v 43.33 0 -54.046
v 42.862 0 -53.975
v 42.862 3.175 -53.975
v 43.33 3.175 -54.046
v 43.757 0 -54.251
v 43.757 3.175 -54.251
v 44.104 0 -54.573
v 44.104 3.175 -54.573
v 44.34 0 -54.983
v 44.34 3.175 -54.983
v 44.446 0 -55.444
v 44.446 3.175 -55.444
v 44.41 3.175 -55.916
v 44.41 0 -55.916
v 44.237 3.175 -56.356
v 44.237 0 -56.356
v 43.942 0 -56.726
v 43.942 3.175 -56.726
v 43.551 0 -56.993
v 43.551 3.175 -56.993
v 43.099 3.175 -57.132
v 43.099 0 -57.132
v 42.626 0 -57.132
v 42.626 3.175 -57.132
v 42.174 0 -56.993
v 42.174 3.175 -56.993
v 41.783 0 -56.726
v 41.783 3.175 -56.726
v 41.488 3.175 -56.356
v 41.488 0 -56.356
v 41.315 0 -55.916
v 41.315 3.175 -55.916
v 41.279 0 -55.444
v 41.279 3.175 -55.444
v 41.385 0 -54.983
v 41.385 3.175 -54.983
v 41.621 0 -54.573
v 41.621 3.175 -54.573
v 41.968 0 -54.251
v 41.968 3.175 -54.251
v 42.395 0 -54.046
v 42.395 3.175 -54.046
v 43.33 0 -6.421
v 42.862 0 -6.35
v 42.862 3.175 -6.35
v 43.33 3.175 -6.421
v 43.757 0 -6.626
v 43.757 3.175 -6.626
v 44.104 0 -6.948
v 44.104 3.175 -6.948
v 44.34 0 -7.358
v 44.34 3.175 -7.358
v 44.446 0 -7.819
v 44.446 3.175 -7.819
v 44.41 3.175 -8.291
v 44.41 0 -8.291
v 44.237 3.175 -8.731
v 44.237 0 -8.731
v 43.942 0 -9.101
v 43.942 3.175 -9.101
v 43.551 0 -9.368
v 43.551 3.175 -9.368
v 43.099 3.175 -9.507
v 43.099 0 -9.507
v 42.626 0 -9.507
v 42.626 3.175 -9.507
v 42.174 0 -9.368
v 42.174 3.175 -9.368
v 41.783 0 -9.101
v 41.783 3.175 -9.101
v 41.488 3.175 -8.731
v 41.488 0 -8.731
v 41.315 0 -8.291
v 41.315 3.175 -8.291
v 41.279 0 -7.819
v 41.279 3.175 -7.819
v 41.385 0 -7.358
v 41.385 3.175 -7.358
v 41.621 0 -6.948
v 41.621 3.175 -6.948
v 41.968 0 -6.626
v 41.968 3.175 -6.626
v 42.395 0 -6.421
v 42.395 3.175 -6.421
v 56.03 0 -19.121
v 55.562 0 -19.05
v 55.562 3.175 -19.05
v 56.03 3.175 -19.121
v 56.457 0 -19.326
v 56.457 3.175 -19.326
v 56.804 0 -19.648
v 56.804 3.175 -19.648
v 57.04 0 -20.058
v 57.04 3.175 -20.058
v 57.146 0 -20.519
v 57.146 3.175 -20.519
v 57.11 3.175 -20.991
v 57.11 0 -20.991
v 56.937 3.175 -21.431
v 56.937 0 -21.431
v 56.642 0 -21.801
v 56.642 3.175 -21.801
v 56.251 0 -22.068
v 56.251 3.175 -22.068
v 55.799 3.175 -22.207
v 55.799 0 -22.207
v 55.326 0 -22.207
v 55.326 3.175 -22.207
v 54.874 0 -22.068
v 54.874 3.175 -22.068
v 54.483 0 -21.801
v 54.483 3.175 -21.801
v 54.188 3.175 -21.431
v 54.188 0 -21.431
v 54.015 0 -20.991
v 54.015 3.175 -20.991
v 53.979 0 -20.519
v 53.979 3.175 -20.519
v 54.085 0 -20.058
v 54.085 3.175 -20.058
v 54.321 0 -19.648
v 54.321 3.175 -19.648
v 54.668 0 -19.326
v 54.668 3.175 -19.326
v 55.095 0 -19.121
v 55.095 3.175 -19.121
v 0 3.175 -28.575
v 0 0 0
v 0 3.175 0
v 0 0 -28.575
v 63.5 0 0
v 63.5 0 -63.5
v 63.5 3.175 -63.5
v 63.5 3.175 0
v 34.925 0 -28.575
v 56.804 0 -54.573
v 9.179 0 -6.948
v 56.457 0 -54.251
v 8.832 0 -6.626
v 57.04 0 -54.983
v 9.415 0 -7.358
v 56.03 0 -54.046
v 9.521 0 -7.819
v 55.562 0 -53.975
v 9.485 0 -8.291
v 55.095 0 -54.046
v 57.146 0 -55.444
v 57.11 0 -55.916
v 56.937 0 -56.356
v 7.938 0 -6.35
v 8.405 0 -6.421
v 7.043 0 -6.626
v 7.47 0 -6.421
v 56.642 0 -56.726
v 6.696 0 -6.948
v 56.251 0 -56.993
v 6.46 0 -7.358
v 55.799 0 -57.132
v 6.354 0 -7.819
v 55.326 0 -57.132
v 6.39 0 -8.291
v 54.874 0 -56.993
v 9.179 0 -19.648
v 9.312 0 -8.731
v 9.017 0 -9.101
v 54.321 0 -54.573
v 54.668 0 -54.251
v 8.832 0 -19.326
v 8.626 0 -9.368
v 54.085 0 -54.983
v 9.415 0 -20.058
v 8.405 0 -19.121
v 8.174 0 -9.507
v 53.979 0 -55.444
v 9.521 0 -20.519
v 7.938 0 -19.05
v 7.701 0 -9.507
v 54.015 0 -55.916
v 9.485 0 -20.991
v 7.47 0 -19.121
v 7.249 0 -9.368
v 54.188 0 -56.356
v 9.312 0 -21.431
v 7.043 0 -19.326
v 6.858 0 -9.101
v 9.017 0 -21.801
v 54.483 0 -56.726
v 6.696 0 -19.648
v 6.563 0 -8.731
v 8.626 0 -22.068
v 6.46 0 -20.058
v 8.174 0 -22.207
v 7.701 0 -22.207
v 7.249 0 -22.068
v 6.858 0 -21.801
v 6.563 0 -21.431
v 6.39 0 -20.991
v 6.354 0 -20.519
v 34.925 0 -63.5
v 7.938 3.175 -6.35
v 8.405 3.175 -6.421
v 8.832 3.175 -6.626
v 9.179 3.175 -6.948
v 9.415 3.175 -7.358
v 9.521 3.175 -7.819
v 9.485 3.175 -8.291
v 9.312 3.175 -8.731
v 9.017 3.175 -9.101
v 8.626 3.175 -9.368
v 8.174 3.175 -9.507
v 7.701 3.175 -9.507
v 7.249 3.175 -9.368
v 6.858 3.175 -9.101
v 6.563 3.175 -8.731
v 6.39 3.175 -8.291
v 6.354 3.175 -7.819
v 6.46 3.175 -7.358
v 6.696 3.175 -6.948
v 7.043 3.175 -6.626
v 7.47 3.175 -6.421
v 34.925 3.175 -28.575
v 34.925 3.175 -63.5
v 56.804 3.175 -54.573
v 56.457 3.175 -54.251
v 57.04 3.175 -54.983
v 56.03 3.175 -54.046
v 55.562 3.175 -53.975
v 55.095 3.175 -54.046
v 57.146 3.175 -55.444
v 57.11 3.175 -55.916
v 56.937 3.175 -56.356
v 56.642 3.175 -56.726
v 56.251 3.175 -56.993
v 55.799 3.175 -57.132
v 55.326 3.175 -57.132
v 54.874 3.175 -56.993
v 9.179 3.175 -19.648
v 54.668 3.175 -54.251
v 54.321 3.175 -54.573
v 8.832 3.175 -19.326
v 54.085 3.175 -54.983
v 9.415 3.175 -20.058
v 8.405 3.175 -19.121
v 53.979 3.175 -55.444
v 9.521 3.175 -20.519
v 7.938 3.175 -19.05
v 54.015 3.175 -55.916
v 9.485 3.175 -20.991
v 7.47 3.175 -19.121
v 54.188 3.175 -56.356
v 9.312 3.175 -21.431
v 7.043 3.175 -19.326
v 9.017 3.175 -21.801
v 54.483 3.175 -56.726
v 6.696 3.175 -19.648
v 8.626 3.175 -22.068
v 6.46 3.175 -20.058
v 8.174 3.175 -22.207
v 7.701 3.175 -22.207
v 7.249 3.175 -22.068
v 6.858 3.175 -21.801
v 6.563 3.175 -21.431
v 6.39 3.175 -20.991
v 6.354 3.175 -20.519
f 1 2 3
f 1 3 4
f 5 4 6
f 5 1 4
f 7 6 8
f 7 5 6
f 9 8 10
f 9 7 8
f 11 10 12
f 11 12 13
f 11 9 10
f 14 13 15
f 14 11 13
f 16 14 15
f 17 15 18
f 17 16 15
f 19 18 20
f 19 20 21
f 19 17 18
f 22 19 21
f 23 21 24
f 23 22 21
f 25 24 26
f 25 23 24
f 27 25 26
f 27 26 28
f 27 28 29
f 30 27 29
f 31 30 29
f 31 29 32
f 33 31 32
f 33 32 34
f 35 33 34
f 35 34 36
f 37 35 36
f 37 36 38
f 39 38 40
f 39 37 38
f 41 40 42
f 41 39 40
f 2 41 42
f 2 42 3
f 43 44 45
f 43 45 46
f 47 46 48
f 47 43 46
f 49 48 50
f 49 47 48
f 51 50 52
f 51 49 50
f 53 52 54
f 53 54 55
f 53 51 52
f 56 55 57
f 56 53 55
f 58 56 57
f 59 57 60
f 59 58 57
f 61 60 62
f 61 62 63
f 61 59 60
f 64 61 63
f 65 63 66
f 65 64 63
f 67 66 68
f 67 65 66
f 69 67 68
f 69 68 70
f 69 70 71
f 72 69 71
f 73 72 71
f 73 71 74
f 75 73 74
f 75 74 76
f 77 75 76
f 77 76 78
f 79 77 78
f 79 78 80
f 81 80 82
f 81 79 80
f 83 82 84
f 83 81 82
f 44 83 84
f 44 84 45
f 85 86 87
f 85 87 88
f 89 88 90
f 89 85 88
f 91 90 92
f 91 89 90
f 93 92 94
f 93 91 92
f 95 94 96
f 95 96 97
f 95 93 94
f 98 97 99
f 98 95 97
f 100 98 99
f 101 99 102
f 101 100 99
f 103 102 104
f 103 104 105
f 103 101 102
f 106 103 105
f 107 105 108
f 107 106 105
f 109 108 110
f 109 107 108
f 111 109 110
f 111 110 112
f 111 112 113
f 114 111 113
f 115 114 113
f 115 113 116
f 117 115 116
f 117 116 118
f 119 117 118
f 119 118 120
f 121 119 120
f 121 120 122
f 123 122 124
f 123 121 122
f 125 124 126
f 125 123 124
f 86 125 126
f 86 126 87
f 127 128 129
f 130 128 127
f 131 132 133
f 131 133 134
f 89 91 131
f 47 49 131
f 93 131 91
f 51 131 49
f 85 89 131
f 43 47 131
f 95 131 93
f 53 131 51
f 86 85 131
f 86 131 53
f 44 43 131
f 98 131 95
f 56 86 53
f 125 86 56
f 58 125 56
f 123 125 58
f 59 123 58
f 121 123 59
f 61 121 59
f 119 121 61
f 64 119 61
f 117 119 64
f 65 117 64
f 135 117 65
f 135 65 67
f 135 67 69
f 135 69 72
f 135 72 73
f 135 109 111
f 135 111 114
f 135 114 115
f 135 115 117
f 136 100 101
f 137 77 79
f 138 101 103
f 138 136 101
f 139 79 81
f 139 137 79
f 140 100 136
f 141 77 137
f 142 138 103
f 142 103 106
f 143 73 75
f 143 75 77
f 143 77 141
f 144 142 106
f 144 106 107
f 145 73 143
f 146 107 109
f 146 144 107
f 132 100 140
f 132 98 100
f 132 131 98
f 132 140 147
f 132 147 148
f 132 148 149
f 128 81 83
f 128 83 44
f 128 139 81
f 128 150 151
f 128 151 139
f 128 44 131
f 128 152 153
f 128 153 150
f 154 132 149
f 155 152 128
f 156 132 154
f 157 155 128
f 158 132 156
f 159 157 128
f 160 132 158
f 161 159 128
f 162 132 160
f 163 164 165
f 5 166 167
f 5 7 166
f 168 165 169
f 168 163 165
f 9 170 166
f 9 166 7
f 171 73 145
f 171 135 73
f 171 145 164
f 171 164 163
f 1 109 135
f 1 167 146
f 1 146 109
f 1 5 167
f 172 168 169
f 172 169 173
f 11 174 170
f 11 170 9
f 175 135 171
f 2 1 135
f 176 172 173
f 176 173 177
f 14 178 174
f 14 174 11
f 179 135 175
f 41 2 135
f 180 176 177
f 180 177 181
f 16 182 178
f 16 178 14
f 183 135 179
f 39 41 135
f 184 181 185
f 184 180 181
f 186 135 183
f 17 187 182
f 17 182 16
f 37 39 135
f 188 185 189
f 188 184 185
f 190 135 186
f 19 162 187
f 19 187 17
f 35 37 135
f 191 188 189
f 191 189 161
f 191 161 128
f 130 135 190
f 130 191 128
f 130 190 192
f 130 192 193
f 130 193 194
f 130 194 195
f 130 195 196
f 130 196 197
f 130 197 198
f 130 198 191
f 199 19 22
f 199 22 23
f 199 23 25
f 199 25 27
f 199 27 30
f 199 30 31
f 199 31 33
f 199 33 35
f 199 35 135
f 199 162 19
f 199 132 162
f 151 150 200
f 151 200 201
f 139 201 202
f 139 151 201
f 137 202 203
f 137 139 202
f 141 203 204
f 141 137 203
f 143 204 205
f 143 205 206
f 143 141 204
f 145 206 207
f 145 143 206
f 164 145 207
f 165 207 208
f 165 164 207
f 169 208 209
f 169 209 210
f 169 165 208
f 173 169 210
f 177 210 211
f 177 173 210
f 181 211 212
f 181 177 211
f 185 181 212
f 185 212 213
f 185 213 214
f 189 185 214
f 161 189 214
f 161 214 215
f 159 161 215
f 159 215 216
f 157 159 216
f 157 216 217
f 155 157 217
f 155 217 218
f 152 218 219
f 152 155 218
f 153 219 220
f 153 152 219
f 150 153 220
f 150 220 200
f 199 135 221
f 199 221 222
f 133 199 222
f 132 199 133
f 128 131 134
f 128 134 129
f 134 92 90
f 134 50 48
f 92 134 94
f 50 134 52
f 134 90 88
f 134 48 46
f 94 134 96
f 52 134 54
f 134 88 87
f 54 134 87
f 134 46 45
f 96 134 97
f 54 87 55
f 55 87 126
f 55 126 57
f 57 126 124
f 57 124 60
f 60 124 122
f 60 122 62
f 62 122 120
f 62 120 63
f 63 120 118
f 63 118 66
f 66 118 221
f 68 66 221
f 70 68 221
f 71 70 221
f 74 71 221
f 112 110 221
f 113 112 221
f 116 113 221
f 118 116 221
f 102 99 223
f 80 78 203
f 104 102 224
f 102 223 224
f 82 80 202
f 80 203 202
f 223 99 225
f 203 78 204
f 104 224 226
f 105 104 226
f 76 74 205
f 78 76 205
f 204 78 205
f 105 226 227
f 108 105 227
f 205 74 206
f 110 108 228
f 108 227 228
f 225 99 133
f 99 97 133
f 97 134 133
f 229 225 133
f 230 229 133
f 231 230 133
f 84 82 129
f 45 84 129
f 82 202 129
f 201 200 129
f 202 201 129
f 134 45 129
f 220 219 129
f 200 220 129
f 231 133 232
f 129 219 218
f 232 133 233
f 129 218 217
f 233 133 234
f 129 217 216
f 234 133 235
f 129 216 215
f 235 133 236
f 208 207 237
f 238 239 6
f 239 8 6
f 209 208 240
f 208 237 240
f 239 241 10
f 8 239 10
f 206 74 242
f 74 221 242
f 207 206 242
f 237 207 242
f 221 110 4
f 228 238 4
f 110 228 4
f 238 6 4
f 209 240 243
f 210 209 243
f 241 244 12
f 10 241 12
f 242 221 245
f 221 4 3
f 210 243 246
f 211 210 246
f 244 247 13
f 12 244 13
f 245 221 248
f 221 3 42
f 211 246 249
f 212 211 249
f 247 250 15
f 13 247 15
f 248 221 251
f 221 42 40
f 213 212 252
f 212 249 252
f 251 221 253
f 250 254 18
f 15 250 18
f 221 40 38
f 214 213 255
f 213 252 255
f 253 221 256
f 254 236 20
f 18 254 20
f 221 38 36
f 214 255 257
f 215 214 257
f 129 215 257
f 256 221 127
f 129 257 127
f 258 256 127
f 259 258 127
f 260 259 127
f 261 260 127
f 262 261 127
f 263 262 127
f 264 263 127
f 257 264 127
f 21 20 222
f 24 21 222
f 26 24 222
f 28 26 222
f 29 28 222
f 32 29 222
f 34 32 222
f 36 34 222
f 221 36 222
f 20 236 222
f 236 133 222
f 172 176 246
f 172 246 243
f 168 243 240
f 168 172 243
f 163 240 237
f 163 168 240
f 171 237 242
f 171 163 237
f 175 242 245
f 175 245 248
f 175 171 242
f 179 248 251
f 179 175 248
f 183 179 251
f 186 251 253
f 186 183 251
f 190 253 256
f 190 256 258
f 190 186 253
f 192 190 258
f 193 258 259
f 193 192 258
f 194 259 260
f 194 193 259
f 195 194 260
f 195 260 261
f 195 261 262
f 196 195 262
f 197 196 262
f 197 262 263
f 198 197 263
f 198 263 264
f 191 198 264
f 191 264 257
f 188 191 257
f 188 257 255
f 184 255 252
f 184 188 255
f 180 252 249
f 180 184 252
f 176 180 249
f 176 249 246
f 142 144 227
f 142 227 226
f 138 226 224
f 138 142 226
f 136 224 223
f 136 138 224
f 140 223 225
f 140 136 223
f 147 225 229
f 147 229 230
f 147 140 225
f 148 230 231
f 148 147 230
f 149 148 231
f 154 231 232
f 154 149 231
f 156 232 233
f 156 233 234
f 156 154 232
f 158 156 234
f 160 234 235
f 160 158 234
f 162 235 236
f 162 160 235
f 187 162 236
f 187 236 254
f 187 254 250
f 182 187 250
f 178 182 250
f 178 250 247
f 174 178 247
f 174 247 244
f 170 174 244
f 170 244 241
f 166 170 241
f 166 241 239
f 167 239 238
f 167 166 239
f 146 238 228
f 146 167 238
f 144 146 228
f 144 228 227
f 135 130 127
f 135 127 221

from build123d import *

# Parameters (mm, degrees)
SKETCH1_R           = 1.5875
BOSS_EXTRUDE1_DEPTH = 3.175


with BuildPart() as part:
    # Sketch1 → Boss-Extrude1 (new body)
    with BuildSketch(Plane(origin=(0, 0, 0), x_dir=(1, 0, 0), z_dir=(0, 1, 0))):
        Polygon((0, 0), (0, 28.575), (34.925, 28.575), (34.925, 63.5), (63.5, 63.5), (63.5, 0), align=None)
        with Locations(Location((7.9375, 20.6375, 0), (0, 0, 270))):
            Circle(SKETCH1_R, mode=Mode.SUBTRACT)
        with Locations(Location((7.9375, 7.9375, 0), (0, 0, 270))):
            Circle(SKETCH1_R, mode=Mode.SUBTRACT)
        with Locations(Location((42.8625, 7.9375, 0), (0, 0, 270))):
            Circle(SKETCH1_R, mode=Mode.SUBTRACT)
        with Locations(Location((55.5625, 20.6375, 0), (0, 0, 270))):
            Circle(SKETCH1_R, mode=Mode.SUBTRACT)
        with Locations(Location((55.5625, 55.5625, 0), (0, 0, 270))):
            Circle(SKETCH1_R, mode=Mode.SUBTRACT)
        with Locations(Location((42.8625, 55.5625, 0), (0, 0, 270))):
            Circle(SKETCH1_R, mode=Mode.SUBTRACT)
    extrude(amount=BOSS_EXTRUDE1_DEPTH)


solid = part.part
